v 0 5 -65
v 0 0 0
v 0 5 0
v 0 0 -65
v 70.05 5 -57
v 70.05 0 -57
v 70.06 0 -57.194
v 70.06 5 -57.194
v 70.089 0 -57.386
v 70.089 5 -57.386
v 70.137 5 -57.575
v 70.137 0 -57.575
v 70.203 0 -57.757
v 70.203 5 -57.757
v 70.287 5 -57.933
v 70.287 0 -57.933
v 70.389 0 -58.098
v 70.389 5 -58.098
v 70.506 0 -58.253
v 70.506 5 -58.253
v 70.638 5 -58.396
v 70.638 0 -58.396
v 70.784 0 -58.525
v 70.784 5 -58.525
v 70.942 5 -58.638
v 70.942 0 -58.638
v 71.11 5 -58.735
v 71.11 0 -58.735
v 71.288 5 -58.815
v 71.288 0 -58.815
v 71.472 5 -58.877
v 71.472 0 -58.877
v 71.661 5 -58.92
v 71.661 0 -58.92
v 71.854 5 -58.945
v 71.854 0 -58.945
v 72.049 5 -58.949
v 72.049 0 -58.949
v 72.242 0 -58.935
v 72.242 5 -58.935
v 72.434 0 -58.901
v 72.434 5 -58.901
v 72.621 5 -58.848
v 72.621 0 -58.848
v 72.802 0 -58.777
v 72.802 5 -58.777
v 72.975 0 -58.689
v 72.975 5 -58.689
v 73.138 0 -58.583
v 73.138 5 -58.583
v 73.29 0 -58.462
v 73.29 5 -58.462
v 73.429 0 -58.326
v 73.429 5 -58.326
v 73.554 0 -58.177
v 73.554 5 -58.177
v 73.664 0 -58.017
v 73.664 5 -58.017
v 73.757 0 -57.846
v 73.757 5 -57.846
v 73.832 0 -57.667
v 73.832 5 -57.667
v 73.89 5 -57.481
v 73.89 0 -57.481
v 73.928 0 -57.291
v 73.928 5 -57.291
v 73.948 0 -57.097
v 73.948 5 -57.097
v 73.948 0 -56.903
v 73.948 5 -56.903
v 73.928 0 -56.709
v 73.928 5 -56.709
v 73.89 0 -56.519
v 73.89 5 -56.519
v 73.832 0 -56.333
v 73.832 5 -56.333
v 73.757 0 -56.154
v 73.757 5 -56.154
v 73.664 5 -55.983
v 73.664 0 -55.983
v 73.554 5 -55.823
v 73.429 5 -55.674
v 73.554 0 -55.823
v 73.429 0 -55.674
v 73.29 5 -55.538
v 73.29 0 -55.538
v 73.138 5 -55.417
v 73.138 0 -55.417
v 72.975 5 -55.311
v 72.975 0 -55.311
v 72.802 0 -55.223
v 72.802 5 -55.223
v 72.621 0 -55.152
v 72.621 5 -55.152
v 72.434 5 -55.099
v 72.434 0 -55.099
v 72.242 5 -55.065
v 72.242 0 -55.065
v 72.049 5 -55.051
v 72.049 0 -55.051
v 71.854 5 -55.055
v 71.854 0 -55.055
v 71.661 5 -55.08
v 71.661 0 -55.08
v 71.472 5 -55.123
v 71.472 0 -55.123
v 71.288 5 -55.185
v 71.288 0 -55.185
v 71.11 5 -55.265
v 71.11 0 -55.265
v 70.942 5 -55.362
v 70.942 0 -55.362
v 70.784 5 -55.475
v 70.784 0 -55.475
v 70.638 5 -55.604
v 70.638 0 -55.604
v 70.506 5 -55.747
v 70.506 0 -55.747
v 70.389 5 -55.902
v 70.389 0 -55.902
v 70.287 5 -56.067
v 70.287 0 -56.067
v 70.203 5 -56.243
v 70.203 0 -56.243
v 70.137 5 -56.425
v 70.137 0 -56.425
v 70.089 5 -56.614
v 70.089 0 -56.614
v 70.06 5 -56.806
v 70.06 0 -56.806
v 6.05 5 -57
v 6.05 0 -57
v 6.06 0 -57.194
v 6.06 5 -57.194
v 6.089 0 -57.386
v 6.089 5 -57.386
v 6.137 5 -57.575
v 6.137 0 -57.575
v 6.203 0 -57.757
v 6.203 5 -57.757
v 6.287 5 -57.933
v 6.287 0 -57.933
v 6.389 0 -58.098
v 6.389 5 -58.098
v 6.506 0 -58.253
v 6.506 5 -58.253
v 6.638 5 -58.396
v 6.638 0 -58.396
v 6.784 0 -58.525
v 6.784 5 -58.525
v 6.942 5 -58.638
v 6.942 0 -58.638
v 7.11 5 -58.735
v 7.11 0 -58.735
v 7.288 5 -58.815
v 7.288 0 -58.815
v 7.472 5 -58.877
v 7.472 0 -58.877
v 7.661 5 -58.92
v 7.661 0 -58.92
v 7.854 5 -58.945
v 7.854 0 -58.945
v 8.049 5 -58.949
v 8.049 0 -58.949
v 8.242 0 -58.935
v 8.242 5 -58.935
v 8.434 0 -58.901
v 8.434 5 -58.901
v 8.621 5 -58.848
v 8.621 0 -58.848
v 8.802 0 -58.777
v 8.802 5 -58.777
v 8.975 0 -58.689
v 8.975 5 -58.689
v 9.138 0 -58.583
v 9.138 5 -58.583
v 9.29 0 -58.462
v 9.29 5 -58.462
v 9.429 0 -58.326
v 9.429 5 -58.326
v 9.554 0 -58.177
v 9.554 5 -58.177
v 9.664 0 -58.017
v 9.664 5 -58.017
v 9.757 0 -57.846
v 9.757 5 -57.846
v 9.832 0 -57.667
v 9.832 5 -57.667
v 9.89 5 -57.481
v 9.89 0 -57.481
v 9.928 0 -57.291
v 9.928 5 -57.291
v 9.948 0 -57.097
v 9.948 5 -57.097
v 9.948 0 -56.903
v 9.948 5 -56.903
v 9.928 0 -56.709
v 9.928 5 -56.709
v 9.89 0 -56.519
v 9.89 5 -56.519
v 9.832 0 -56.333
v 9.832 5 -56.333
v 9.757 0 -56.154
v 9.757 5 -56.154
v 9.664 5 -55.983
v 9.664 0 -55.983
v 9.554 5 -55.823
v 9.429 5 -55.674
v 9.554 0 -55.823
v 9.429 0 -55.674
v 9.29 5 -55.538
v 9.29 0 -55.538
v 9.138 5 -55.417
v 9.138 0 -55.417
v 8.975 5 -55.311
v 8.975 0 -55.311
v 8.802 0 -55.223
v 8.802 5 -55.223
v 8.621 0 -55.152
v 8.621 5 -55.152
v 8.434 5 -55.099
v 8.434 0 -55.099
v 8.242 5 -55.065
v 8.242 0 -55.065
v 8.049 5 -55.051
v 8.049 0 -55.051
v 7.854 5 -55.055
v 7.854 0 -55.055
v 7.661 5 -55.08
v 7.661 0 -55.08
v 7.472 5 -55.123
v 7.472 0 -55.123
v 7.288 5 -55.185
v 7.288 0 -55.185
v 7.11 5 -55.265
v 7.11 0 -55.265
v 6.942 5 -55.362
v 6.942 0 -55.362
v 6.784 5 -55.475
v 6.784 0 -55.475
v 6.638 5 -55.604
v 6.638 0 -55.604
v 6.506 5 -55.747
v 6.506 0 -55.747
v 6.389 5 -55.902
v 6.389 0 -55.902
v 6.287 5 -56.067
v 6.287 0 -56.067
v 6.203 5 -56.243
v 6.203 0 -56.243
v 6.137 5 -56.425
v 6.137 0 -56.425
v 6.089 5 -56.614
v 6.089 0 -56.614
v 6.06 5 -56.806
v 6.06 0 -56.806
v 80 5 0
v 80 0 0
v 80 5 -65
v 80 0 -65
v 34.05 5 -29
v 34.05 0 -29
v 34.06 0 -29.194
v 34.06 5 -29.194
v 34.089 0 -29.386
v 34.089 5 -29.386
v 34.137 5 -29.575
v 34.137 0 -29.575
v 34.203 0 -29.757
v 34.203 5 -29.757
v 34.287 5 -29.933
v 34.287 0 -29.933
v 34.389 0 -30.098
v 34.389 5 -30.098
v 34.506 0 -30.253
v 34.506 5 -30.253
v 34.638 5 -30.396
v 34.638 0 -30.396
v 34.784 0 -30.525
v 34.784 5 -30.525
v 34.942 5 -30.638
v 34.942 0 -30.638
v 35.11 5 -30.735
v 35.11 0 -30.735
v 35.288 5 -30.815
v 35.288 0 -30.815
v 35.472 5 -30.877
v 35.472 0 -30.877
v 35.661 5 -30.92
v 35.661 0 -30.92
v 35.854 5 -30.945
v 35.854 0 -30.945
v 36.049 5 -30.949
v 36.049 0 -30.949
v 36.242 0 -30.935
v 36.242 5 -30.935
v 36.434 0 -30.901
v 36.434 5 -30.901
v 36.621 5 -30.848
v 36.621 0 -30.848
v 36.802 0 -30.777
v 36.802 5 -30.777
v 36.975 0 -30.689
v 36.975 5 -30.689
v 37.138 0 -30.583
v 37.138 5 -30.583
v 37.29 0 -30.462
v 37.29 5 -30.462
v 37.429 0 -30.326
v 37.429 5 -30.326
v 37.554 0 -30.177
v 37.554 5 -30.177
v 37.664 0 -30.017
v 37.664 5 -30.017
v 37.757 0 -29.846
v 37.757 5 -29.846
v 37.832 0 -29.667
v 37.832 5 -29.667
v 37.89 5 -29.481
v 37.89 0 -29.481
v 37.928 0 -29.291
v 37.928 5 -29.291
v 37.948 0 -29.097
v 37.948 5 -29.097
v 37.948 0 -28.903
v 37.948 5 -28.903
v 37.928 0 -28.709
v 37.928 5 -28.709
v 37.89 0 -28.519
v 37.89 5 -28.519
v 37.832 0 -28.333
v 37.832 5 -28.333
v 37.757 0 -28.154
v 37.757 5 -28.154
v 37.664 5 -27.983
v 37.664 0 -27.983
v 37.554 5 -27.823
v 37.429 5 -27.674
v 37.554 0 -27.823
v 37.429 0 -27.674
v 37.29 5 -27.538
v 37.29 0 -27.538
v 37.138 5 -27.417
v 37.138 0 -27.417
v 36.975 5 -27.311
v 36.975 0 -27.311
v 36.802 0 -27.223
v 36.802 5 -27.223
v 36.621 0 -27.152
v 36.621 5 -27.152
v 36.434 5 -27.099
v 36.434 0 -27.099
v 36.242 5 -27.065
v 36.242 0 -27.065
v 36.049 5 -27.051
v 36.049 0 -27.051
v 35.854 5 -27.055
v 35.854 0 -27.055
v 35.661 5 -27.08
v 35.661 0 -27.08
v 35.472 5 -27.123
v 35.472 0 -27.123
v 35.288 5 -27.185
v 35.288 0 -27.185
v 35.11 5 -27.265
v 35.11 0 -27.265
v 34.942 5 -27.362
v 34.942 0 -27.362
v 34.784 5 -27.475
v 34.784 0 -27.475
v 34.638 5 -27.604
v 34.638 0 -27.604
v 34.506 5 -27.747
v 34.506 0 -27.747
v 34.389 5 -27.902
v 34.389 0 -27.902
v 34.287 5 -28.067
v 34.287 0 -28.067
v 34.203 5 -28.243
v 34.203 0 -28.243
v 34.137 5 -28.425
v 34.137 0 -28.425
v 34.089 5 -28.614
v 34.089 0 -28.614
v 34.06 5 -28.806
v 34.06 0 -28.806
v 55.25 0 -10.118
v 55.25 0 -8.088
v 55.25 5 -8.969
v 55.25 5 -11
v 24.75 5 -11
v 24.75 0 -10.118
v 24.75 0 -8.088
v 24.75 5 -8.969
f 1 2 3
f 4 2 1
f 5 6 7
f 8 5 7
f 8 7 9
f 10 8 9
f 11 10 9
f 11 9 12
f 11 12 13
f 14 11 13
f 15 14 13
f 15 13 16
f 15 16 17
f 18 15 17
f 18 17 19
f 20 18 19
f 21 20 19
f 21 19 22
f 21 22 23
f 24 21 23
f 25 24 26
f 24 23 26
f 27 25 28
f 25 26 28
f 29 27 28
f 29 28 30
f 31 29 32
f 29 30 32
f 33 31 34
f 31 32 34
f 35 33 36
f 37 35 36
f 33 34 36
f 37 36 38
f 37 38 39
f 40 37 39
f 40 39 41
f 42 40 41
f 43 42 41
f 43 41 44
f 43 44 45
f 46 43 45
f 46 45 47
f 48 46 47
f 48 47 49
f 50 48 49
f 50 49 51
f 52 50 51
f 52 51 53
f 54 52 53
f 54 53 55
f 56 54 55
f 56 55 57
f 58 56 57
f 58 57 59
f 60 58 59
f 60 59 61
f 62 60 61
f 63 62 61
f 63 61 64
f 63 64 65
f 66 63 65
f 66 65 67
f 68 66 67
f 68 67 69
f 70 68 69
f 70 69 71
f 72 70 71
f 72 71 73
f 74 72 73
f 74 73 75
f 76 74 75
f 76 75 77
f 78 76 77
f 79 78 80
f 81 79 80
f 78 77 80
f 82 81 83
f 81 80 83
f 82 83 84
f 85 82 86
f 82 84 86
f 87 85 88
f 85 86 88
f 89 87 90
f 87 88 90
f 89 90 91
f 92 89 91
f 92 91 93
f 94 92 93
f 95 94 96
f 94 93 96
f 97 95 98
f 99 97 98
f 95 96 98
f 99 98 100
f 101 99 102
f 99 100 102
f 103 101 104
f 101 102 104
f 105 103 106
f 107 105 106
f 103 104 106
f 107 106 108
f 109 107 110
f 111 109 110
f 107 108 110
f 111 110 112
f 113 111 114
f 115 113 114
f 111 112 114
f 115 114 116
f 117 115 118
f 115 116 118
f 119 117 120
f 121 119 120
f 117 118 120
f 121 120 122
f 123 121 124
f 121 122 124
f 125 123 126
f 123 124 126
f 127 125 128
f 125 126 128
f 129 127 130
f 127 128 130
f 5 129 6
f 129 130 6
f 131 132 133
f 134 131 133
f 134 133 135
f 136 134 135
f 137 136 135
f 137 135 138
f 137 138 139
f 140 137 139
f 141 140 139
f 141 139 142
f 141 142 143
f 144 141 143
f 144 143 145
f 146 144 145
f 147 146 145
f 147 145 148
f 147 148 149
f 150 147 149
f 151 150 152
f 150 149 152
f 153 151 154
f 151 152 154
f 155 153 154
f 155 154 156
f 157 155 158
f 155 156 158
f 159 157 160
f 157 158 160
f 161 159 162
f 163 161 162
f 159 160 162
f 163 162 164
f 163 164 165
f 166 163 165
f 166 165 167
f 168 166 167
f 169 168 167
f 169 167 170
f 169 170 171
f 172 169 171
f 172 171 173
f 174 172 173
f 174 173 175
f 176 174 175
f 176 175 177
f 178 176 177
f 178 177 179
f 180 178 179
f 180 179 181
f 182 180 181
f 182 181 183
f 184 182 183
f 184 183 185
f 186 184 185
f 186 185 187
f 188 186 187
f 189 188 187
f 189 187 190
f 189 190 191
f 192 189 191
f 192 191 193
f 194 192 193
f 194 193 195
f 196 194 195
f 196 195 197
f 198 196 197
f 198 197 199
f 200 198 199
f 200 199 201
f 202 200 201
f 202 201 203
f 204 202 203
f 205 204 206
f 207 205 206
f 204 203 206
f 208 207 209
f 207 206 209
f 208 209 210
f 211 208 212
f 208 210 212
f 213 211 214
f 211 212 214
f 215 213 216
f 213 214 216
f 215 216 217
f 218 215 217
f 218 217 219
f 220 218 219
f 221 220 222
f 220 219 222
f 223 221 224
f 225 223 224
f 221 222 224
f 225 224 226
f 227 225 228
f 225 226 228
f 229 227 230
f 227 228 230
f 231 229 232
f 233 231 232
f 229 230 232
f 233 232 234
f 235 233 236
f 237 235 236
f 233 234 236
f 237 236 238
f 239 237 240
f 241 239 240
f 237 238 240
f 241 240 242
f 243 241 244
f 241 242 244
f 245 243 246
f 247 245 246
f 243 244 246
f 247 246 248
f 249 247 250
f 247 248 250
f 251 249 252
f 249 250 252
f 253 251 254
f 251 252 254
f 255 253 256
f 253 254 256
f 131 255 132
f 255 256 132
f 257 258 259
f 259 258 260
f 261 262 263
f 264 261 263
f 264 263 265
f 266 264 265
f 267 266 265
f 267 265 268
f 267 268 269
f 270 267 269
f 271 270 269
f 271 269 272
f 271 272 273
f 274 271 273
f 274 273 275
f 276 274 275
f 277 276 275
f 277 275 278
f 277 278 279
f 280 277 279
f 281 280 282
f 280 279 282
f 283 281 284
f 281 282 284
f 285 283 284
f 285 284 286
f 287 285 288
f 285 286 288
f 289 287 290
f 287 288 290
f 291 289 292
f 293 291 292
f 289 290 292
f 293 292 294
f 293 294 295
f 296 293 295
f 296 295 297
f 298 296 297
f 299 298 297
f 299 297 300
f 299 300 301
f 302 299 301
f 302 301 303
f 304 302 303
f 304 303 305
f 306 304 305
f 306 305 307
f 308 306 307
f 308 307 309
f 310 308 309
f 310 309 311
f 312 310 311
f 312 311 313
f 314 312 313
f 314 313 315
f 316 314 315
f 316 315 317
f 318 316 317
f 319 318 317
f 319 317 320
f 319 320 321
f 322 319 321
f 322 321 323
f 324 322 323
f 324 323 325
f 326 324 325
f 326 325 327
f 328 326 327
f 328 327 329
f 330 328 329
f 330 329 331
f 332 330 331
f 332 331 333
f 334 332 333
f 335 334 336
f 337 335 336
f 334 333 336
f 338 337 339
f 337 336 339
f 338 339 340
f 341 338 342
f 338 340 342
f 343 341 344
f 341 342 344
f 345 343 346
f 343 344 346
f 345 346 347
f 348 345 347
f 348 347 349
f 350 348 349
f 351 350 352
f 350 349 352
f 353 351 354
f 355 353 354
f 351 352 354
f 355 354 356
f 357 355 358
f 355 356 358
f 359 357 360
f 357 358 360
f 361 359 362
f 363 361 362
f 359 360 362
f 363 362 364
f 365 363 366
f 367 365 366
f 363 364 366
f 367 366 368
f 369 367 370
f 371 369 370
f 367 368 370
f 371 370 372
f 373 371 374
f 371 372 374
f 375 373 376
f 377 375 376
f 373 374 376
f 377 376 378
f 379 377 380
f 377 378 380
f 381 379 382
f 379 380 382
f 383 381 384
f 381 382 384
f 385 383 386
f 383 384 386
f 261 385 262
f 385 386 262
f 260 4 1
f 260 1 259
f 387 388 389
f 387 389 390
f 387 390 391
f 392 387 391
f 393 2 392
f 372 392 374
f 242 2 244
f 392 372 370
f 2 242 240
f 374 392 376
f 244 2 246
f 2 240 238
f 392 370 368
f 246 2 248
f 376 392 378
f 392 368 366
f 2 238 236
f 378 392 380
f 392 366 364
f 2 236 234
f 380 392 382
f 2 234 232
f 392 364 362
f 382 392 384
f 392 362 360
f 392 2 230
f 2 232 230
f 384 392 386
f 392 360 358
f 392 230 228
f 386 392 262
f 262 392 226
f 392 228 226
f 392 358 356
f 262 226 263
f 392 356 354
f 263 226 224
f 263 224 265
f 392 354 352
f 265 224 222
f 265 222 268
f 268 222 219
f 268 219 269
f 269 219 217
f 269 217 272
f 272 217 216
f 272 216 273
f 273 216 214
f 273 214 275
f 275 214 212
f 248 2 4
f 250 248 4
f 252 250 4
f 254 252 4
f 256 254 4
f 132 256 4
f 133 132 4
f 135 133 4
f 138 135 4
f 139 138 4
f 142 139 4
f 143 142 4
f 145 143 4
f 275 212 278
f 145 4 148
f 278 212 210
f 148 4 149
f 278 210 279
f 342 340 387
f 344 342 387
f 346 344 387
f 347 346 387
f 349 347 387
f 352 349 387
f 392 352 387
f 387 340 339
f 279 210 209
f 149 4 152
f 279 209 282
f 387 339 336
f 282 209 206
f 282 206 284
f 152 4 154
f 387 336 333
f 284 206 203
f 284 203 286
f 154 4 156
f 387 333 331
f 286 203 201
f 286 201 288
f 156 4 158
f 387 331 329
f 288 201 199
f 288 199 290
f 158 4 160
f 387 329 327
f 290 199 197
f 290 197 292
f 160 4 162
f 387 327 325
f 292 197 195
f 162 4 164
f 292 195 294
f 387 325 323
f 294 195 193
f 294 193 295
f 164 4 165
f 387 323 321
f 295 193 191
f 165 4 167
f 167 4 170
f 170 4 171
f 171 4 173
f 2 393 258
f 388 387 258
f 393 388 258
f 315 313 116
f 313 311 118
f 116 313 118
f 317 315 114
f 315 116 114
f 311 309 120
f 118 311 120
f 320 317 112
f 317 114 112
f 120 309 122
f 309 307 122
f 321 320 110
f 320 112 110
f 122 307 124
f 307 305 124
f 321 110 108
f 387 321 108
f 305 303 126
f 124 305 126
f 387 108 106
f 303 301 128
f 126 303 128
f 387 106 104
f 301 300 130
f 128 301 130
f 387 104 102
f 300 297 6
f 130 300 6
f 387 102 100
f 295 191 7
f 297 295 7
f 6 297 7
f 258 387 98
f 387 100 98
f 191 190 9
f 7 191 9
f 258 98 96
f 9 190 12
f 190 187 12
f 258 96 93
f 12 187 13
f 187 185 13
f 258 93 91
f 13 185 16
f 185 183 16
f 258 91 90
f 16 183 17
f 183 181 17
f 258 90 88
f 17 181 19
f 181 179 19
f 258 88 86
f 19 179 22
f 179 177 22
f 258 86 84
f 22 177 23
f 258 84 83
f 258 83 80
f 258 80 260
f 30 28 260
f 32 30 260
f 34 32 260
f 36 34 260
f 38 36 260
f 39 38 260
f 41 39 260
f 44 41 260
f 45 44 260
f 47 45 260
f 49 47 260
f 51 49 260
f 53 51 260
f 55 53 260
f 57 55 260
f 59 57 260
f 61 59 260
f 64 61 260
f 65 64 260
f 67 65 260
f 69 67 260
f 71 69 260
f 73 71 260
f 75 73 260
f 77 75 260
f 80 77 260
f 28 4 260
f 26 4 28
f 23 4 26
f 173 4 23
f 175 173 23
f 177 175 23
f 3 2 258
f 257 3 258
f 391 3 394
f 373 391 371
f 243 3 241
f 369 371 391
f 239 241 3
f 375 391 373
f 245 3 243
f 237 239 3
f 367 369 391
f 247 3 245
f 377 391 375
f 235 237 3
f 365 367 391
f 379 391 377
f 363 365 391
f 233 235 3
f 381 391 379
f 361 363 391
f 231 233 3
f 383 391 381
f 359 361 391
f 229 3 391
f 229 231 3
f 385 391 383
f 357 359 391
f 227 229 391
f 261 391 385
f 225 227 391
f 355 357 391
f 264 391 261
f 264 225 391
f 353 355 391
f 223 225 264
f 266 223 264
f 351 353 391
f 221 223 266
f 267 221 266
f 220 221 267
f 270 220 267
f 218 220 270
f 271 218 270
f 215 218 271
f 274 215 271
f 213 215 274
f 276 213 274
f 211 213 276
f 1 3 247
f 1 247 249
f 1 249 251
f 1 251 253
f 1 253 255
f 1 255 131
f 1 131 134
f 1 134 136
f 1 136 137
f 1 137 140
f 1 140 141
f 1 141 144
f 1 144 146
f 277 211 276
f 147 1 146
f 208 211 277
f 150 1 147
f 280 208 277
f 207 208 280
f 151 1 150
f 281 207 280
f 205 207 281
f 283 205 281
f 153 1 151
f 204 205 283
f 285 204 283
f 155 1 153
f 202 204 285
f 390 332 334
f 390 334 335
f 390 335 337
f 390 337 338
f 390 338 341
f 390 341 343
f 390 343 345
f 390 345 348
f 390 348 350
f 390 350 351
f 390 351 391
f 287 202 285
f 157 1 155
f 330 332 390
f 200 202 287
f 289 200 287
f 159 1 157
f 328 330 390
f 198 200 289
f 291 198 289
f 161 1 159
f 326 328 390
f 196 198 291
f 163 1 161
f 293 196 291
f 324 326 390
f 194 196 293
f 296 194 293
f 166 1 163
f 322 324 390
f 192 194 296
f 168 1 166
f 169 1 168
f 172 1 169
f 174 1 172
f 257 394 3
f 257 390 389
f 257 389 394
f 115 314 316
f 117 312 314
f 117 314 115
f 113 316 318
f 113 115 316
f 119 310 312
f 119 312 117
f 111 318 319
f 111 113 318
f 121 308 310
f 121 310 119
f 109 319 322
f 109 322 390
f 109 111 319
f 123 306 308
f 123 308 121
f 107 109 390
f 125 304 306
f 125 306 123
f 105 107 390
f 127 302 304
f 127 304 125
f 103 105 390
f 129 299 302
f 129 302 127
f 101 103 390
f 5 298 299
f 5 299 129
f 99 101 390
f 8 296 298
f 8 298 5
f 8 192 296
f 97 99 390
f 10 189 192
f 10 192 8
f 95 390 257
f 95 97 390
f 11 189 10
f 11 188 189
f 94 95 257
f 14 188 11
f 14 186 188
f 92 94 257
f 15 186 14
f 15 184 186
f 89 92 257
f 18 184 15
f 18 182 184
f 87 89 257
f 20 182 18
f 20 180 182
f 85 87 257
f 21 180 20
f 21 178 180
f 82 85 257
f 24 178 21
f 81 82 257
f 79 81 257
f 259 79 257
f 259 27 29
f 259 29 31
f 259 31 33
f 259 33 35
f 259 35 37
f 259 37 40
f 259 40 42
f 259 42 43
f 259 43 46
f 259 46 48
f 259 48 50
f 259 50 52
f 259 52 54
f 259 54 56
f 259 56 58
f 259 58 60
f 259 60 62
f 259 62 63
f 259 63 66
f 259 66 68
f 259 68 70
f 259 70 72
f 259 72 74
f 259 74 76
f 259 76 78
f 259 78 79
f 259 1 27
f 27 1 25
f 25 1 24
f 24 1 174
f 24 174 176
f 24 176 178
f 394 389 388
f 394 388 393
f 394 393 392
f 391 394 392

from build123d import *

# Parameters (mm, degrees)
ESQUISSE1_W                  = 80
ESQUISSE1_H                  = 65
BOSS_EXTRU_1_DEPTH           = 5
D_GAGEMENT_M3_51_D           = 3.9
ESQUISSE7_W                  = 30.5
ESQUISSE7_H                  = 2
ENL_V_MAT_EXTRU_1_DEPTH      = 5.924038765
ENL_V_MAT_EXTRU_1_DEPTH_BACK = 12.287131548


with BuildPart() as part:
    # Esquisse1 → Boss.-Extru.1 (new body)
    with BuildSketch(Plane(origin=(0, 0, 0), x_dir=(1, 0, 0), z_dir=(0, 1, 0))):
        with Locations((40, 32.5)):
            Rectangle(ESQUISSE1_W, ESQUISSE1_H)
    extrude(amount=BOSS_EXTRU_1_DEPTH)

    # Dégagement M3.51 (through all)
    with Locations(Plane(origin=(0, 5, 0), x_dir=(1, 0, 0), z_dir=(0, 1, 0))):
        with Locations((8, 57), (36, 29), (72, 57)):
            Hole(D_GAGEMENT_M3_51_D / 2)

    # Esquisse7 → Enlèv. mat.-Extru.1 (cut, two sides)
    with BuildSketch(Plane(origin=(0, 4.849231552, -0.855050358), x_dir=(-1, 0, 0), z_dir=(0, -0.984807753, 0.173648178))) as enl_v_mat_extru_1_sk:
        with Locations((-40, 8.964644395)):
            Rectangle(ESQUISSE7_W, ESQUISSE7_H)
    extrude(amount=ENL_V_MAT_EXTRU_1_DEPTH, mode=Mode.SUBTRACT)
    extrude(enl_v_mat_extru_1_sk.sketch, amount=-ENL_V_MAT_EXTRU_1_DEPTH_BACK, mode=Mode.SUBTRACT)


solid = part.part
